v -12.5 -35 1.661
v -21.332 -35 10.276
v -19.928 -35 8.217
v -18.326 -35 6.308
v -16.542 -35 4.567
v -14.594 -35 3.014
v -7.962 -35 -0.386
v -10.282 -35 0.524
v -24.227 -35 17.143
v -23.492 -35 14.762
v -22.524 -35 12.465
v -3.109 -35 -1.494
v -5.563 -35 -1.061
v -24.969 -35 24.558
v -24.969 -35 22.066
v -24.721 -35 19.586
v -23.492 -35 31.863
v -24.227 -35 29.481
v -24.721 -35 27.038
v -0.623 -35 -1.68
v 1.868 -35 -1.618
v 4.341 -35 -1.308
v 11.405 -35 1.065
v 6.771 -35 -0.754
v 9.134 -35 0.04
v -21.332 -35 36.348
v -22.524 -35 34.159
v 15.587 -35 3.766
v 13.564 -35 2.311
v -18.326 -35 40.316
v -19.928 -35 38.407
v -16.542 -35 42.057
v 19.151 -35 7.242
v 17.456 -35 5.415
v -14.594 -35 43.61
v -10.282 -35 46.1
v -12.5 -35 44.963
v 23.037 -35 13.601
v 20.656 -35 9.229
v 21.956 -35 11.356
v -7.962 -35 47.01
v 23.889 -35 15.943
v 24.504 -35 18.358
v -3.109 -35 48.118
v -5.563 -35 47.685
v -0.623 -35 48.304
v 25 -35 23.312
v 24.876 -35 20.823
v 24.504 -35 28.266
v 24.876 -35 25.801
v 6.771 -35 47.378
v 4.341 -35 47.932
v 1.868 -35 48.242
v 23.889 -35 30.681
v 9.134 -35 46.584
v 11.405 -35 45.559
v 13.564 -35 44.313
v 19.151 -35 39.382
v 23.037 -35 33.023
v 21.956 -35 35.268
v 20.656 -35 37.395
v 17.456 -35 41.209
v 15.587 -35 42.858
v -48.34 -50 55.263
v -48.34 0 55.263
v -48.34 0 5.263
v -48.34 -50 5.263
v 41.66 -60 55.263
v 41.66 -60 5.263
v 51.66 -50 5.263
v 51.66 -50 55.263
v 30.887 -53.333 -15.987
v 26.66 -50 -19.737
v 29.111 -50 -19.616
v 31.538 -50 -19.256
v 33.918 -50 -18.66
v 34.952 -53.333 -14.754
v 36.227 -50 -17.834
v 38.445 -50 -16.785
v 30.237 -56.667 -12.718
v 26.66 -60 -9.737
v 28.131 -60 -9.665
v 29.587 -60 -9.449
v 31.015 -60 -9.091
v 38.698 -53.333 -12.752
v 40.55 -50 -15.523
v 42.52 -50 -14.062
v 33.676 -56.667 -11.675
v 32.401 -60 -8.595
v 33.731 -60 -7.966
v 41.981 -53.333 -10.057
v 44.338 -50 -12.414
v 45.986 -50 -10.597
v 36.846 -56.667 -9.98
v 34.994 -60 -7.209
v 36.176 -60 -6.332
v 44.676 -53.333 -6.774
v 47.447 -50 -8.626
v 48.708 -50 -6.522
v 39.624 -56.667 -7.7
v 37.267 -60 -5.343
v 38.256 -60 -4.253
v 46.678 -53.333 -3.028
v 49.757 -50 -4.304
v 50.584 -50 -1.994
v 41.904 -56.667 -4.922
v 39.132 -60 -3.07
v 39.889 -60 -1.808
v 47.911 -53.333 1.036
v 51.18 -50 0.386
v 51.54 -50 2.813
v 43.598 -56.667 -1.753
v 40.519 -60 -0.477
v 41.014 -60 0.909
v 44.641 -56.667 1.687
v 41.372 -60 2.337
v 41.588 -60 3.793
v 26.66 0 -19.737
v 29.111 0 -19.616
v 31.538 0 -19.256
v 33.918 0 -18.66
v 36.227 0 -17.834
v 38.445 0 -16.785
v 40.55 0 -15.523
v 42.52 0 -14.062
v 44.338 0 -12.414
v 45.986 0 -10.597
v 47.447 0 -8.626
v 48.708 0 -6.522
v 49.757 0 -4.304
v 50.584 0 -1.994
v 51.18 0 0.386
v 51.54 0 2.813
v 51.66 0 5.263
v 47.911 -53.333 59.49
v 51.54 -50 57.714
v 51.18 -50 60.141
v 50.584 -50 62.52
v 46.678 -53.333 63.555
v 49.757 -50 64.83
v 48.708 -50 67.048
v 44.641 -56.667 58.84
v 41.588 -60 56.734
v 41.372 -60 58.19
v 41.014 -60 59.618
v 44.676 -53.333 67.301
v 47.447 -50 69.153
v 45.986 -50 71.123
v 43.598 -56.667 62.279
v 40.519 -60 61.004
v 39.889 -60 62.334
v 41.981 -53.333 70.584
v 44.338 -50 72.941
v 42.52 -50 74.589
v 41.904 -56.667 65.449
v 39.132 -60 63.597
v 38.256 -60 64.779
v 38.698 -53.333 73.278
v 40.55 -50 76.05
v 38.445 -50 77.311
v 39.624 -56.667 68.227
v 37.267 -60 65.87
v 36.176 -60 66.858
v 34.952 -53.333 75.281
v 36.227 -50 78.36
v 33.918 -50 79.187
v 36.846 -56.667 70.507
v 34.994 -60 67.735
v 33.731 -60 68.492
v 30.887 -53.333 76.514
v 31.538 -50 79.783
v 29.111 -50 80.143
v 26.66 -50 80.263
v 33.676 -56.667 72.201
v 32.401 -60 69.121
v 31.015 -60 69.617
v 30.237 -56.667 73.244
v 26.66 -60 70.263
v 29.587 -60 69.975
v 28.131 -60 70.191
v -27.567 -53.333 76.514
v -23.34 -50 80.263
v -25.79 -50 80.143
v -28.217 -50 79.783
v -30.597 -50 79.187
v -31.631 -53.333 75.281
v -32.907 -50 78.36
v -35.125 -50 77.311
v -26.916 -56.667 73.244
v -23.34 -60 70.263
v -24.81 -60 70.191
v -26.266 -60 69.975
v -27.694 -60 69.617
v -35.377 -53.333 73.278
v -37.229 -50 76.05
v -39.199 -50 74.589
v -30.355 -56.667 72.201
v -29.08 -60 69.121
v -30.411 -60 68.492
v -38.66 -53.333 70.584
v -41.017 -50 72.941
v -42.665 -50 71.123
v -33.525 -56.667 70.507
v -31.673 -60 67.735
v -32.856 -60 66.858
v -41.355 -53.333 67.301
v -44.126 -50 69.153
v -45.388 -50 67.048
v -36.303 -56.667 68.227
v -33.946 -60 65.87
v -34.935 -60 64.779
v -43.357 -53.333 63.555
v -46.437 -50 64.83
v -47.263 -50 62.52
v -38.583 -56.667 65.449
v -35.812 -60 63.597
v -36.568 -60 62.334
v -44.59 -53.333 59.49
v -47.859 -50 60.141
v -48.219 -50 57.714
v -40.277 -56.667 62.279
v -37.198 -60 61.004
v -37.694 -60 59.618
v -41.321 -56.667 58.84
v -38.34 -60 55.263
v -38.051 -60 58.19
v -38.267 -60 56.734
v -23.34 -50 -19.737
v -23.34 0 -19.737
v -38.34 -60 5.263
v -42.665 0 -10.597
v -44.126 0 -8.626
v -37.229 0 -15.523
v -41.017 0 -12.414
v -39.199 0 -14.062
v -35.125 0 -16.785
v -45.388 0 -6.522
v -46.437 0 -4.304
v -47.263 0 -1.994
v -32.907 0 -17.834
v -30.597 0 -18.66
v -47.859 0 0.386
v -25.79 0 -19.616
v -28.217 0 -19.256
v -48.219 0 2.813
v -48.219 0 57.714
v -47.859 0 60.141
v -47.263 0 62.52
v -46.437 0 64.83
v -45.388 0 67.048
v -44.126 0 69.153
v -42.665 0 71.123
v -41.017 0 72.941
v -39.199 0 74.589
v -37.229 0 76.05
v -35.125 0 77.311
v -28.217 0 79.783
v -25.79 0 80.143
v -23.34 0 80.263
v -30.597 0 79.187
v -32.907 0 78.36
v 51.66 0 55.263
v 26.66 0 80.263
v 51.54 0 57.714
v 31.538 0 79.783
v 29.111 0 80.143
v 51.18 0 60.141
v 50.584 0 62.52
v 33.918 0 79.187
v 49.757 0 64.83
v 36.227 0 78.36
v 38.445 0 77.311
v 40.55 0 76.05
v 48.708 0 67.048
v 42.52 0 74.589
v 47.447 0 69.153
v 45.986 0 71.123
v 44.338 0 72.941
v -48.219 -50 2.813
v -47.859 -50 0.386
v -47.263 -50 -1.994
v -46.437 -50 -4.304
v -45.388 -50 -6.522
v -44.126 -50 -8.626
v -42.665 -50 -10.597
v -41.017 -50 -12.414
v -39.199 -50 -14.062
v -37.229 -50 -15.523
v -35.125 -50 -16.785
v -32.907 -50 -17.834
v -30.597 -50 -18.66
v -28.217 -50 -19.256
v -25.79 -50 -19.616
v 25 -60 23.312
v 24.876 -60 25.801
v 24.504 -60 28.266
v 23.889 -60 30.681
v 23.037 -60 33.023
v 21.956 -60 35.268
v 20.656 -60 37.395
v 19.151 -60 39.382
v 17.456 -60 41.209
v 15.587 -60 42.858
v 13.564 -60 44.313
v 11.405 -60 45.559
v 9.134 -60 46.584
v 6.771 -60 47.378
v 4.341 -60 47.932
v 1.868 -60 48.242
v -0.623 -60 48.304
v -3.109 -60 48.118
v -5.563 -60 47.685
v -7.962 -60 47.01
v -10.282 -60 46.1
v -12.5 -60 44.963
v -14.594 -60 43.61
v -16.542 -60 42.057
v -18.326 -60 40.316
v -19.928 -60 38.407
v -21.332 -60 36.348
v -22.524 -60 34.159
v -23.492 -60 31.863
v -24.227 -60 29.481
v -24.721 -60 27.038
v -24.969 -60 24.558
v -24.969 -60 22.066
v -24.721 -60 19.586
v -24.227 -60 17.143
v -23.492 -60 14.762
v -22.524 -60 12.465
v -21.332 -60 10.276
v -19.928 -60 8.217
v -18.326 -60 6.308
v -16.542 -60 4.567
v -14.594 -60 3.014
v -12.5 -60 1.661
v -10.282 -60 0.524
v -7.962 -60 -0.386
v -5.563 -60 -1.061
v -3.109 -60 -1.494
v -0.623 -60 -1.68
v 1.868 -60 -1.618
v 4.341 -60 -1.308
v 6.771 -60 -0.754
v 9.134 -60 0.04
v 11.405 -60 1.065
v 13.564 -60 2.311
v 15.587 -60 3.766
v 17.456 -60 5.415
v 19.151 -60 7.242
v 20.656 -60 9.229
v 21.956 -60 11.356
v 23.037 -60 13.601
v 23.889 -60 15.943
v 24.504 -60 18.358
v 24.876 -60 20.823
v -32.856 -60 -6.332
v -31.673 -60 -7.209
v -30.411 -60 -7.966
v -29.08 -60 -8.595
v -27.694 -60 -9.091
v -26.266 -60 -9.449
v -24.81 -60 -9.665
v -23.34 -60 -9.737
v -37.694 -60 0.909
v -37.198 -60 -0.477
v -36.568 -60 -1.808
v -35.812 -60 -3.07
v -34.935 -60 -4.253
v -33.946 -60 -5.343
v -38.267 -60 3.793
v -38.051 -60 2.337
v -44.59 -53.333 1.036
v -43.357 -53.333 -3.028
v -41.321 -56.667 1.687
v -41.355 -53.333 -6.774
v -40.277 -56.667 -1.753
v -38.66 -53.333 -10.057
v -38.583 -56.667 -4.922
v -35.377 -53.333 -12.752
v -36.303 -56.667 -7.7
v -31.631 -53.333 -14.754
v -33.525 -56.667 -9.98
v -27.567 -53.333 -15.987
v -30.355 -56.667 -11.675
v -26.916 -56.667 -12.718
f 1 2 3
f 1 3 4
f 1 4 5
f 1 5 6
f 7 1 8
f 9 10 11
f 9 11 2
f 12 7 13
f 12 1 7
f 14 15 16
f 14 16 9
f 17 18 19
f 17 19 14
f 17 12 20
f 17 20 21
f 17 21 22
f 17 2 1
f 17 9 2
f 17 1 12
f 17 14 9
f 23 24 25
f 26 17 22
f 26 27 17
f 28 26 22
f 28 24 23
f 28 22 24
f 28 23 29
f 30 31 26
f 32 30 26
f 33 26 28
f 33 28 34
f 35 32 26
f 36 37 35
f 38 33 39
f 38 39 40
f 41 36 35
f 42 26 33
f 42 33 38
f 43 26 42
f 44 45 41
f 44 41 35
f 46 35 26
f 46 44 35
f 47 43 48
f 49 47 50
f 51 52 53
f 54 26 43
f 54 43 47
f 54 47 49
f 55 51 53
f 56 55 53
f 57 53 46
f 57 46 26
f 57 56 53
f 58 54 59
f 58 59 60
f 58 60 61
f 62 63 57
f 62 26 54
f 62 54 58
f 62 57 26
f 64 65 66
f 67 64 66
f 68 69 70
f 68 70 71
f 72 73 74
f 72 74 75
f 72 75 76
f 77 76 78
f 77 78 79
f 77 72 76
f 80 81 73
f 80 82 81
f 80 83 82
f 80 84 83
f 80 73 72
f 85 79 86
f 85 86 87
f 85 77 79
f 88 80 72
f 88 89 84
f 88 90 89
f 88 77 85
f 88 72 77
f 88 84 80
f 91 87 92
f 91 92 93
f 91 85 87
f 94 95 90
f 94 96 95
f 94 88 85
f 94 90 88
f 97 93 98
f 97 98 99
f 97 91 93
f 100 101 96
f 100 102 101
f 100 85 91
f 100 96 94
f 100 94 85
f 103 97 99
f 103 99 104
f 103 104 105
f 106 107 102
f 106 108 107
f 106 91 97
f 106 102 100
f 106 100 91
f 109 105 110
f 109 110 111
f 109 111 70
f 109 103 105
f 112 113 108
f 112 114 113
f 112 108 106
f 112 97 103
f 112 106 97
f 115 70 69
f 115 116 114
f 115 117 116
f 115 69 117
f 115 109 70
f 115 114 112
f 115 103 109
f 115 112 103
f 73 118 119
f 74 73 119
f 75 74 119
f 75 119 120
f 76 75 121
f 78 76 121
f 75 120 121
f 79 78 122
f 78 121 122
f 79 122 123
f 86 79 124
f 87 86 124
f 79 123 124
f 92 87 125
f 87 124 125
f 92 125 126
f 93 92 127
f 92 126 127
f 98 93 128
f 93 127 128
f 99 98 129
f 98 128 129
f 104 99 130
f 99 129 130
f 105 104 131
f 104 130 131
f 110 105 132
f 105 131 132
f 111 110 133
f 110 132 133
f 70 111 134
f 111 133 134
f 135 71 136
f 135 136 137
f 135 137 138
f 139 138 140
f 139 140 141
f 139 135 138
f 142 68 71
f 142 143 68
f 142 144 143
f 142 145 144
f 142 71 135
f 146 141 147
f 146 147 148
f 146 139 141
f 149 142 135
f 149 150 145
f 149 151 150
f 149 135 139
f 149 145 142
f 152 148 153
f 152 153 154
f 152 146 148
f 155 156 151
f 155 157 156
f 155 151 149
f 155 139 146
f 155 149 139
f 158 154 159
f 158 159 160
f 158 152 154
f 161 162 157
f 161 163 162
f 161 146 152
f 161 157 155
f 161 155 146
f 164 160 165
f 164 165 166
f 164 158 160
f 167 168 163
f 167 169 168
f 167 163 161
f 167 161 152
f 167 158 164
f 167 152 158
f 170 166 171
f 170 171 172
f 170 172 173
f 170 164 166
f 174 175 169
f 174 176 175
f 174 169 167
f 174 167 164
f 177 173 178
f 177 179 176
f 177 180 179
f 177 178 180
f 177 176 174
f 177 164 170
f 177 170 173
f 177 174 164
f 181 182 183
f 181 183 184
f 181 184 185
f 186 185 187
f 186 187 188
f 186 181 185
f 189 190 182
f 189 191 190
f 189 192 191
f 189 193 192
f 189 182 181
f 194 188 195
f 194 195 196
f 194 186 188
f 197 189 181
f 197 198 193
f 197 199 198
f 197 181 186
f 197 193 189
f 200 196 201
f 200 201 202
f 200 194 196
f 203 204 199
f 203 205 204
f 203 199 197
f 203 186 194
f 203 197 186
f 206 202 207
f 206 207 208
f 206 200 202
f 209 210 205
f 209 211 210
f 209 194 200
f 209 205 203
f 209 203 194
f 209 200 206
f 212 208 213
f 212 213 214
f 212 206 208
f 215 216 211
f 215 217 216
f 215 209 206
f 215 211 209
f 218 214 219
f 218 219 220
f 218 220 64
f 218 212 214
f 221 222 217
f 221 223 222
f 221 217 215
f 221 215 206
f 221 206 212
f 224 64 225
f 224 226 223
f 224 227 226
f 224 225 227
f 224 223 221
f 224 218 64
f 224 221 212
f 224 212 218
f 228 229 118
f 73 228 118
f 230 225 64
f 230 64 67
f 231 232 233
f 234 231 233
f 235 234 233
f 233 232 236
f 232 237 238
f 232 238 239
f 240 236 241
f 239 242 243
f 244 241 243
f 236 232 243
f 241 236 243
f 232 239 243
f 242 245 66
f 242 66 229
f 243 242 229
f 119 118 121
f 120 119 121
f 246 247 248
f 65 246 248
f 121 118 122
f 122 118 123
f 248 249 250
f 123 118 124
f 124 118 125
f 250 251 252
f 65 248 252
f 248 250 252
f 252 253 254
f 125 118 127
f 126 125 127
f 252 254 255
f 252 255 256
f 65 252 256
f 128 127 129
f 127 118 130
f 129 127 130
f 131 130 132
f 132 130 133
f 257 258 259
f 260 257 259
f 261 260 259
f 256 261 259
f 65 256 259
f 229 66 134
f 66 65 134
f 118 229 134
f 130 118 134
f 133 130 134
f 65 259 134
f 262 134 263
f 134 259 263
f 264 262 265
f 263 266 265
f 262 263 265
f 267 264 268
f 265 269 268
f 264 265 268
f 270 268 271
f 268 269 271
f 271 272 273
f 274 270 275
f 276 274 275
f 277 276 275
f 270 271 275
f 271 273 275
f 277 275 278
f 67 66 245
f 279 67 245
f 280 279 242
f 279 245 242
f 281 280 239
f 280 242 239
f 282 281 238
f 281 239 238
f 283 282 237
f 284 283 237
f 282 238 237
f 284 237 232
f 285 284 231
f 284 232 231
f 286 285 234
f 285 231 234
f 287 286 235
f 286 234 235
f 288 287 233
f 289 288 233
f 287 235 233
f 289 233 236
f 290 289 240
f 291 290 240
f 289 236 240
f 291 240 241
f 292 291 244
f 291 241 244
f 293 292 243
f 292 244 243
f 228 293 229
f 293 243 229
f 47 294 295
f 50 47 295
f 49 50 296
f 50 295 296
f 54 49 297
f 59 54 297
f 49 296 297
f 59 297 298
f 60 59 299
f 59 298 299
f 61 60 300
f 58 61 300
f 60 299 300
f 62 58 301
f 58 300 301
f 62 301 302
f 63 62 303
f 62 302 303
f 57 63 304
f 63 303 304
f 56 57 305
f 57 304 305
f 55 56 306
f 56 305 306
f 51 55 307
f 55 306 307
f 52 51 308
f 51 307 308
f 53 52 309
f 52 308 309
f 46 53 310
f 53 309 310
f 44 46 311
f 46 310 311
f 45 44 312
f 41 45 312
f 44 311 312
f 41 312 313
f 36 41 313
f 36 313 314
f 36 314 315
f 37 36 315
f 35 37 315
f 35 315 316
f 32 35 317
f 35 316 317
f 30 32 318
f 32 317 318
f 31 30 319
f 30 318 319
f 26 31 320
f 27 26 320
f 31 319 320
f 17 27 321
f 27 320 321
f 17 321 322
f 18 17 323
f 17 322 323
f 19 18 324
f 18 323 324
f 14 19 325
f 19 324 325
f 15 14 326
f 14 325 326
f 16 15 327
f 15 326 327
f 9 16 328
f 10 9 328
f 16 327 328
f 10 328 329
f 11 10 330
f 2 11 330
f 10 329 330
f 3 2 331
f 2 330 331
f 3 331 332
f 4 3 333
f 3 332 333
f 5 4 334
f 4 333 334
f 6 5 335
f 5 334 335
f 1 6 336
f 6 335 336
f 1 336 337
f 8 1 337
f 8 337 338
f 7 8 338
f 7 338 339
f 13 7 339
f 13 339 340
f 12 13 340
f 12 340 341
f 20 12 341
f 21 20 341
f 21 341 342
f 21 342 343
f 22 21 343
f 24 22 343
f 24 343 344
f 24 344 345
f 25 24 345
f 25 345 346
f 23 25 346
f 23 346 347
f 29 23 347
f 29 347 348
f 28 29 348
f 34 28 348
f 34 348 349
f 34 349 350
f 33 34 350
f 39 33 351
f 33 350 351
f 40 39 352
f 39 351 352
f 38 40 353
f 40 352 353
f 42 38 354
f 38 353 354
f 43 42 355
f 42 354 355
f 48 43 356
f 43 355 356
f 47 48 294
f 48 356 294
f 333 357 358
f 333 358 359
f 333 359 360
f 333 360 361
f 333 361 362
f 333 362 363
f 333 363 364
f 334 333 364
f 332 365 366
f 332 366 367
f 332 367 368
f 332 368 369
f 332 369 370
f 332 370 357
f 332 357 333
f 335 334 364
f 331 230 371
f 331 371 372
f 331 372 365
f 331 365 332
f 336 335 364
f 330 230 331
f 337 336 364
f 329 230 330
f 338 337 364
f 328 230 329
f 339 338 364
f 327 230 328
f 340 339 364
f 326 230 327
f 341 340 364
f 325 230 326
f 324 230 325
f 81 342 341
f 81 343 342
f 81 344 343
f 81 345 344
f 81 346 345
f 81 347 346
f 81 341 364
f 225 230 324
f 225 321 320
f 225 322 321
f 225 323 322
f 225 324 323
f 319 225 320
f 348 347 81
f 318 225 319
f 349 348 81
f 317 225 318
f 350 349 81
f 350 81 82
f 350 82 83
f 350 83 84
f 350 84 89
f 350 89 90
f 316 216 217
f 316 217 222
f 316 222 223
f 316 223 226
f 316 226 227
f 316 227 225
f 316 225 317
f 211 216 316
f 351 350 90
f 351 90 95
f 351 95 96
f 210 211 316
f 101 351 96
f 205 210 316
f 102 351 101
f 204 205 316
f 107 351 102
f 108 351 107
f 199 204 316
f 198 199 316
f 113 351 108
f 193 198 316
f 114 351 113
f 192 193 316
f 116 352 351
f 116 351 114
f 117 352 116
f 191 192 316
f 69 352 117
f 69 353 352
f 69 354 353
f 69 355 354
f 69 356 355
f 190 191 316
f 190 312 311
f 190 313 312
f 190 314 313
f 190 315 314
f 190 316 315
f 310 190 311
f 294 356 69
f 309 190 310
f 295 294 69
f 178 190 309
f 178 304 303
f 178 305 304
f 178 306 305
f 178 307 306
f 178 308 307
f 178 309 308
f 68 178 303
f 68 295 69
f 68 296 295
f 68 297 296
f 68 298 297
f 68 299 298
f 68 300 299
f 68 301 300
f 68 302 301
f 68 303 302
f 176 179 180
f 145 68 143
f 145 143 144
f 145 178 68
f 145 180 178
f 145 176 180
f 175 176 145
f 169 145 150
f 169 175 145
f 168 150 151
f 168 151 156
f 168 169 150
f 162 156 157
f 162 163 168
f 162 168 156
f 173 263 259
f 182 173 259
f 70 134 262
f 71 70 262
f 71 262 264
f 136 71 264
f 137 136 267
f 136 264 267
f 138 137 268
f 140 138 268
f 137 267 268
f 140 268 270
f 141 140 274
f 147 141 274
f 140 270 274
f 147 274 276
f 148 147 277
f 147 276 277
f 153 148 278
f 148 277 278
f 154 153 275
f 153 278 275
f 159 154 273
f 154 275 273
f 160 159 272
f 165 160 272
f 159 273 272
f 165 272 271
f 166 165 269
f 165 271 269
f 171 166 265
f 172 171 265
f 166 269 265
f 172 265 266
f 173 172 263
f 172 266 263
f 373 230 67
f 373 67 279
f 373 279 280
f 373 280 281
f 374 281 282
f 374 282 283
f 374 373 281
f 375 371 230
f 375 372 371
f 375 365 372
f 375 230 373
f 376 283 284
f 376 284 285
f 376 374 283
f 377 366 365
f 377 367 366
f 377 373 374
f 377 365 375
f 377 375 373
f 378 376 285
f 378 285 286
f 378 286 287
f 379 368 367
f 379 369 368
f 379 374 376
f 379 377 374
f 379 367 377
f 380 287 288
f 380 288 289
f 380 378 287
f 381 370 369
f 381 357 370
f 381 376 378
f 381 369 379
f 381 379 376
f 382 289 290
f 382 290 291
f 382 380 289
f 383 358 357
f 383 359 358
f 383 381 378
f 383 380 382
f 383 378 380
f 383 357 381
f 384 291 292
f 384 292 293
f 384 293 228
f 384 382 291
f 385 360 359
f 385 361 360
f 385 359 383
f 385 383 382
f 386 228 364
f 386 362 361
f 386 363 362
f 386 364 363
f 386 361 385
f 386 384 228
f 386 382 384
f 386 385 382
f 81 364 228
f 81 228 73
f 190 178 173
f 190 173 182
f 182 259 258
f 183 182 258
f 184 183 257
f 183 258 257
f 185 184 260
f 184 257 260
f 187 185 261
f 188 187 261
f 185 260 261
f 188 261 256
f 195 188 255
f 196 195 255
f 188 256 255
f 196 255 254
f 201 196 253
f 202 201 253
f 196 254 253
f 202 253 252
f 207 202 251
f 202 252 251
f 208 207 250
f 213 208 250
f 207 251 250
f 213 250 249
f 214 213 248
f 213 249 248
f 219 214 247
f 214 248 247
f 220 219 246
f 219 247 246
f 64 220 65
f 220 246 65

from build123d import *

# Parameters (mm, degrees)
F1_DEPTH = 60
F2_SIZE  = 10
F3_R     = 25
F4_DEPTH = 25


with BuildPart() as f1:
    # F0 (on Front) → F1 (new body)
    with BuildSketch(Plane.XZ):
        with BuildLine():
            Line((26.660392, 80.263265), (-23.339608, 80.263265))
            ThreePointArc((-23.339608, 80.263265), (-41.017278, 72.940934), (-48.339608, 55.263265))
            Line((-48.339608, 55.263265), (-48.339608, 5.263265))
            ThreePointArc((-48.339608, 5.263265), (-41.017278, -12.414405), (-23.339608, -19.736735))
            Line((-23.339608, -19.736735), (26.660392, -19.736735))
            ThreePointArc((26.660392, -19.736735), (44.338061, -12.414405), (51.660392, 5.263265))
            Line((51.660392, 5.263265), (51.660392, 55.263265))
            ThreePointArc((51.660392, 55.263265), (44.338061, 72.940934), (26.660392, 80.263265))
        make_face()
    extrude(amount=F1_DEPTH)

    # F2
    f2_edges = [f1.edges().sort_by_distance(p)[0] for p in [
        (51.660392, -60, 30.263265),
        (44.338061, -60, 72.940934),
        (1.660392, -60, 80.263265),
        (-41.017278, -60, 72.940934),
        (-48.339608, -60, 30.263265),
        (-41.017278, -60, -12.414405),
        (1.660392, -60, -19.736735),
        (44.338061, -60, -12.414405),
    ]]
    chamfer(f2_edges, length=F2_SIZE)

    # F3 (on face) → F4 (cut)
    with BuildSketch(Plane.XZ.offset(60)):
        with Locations((0, 23.312023)):
            Circle(F3_R)
    extrude(amount=-F4_DEPTH, mode=Mode.SUBTRACT)


solid = f1.part
